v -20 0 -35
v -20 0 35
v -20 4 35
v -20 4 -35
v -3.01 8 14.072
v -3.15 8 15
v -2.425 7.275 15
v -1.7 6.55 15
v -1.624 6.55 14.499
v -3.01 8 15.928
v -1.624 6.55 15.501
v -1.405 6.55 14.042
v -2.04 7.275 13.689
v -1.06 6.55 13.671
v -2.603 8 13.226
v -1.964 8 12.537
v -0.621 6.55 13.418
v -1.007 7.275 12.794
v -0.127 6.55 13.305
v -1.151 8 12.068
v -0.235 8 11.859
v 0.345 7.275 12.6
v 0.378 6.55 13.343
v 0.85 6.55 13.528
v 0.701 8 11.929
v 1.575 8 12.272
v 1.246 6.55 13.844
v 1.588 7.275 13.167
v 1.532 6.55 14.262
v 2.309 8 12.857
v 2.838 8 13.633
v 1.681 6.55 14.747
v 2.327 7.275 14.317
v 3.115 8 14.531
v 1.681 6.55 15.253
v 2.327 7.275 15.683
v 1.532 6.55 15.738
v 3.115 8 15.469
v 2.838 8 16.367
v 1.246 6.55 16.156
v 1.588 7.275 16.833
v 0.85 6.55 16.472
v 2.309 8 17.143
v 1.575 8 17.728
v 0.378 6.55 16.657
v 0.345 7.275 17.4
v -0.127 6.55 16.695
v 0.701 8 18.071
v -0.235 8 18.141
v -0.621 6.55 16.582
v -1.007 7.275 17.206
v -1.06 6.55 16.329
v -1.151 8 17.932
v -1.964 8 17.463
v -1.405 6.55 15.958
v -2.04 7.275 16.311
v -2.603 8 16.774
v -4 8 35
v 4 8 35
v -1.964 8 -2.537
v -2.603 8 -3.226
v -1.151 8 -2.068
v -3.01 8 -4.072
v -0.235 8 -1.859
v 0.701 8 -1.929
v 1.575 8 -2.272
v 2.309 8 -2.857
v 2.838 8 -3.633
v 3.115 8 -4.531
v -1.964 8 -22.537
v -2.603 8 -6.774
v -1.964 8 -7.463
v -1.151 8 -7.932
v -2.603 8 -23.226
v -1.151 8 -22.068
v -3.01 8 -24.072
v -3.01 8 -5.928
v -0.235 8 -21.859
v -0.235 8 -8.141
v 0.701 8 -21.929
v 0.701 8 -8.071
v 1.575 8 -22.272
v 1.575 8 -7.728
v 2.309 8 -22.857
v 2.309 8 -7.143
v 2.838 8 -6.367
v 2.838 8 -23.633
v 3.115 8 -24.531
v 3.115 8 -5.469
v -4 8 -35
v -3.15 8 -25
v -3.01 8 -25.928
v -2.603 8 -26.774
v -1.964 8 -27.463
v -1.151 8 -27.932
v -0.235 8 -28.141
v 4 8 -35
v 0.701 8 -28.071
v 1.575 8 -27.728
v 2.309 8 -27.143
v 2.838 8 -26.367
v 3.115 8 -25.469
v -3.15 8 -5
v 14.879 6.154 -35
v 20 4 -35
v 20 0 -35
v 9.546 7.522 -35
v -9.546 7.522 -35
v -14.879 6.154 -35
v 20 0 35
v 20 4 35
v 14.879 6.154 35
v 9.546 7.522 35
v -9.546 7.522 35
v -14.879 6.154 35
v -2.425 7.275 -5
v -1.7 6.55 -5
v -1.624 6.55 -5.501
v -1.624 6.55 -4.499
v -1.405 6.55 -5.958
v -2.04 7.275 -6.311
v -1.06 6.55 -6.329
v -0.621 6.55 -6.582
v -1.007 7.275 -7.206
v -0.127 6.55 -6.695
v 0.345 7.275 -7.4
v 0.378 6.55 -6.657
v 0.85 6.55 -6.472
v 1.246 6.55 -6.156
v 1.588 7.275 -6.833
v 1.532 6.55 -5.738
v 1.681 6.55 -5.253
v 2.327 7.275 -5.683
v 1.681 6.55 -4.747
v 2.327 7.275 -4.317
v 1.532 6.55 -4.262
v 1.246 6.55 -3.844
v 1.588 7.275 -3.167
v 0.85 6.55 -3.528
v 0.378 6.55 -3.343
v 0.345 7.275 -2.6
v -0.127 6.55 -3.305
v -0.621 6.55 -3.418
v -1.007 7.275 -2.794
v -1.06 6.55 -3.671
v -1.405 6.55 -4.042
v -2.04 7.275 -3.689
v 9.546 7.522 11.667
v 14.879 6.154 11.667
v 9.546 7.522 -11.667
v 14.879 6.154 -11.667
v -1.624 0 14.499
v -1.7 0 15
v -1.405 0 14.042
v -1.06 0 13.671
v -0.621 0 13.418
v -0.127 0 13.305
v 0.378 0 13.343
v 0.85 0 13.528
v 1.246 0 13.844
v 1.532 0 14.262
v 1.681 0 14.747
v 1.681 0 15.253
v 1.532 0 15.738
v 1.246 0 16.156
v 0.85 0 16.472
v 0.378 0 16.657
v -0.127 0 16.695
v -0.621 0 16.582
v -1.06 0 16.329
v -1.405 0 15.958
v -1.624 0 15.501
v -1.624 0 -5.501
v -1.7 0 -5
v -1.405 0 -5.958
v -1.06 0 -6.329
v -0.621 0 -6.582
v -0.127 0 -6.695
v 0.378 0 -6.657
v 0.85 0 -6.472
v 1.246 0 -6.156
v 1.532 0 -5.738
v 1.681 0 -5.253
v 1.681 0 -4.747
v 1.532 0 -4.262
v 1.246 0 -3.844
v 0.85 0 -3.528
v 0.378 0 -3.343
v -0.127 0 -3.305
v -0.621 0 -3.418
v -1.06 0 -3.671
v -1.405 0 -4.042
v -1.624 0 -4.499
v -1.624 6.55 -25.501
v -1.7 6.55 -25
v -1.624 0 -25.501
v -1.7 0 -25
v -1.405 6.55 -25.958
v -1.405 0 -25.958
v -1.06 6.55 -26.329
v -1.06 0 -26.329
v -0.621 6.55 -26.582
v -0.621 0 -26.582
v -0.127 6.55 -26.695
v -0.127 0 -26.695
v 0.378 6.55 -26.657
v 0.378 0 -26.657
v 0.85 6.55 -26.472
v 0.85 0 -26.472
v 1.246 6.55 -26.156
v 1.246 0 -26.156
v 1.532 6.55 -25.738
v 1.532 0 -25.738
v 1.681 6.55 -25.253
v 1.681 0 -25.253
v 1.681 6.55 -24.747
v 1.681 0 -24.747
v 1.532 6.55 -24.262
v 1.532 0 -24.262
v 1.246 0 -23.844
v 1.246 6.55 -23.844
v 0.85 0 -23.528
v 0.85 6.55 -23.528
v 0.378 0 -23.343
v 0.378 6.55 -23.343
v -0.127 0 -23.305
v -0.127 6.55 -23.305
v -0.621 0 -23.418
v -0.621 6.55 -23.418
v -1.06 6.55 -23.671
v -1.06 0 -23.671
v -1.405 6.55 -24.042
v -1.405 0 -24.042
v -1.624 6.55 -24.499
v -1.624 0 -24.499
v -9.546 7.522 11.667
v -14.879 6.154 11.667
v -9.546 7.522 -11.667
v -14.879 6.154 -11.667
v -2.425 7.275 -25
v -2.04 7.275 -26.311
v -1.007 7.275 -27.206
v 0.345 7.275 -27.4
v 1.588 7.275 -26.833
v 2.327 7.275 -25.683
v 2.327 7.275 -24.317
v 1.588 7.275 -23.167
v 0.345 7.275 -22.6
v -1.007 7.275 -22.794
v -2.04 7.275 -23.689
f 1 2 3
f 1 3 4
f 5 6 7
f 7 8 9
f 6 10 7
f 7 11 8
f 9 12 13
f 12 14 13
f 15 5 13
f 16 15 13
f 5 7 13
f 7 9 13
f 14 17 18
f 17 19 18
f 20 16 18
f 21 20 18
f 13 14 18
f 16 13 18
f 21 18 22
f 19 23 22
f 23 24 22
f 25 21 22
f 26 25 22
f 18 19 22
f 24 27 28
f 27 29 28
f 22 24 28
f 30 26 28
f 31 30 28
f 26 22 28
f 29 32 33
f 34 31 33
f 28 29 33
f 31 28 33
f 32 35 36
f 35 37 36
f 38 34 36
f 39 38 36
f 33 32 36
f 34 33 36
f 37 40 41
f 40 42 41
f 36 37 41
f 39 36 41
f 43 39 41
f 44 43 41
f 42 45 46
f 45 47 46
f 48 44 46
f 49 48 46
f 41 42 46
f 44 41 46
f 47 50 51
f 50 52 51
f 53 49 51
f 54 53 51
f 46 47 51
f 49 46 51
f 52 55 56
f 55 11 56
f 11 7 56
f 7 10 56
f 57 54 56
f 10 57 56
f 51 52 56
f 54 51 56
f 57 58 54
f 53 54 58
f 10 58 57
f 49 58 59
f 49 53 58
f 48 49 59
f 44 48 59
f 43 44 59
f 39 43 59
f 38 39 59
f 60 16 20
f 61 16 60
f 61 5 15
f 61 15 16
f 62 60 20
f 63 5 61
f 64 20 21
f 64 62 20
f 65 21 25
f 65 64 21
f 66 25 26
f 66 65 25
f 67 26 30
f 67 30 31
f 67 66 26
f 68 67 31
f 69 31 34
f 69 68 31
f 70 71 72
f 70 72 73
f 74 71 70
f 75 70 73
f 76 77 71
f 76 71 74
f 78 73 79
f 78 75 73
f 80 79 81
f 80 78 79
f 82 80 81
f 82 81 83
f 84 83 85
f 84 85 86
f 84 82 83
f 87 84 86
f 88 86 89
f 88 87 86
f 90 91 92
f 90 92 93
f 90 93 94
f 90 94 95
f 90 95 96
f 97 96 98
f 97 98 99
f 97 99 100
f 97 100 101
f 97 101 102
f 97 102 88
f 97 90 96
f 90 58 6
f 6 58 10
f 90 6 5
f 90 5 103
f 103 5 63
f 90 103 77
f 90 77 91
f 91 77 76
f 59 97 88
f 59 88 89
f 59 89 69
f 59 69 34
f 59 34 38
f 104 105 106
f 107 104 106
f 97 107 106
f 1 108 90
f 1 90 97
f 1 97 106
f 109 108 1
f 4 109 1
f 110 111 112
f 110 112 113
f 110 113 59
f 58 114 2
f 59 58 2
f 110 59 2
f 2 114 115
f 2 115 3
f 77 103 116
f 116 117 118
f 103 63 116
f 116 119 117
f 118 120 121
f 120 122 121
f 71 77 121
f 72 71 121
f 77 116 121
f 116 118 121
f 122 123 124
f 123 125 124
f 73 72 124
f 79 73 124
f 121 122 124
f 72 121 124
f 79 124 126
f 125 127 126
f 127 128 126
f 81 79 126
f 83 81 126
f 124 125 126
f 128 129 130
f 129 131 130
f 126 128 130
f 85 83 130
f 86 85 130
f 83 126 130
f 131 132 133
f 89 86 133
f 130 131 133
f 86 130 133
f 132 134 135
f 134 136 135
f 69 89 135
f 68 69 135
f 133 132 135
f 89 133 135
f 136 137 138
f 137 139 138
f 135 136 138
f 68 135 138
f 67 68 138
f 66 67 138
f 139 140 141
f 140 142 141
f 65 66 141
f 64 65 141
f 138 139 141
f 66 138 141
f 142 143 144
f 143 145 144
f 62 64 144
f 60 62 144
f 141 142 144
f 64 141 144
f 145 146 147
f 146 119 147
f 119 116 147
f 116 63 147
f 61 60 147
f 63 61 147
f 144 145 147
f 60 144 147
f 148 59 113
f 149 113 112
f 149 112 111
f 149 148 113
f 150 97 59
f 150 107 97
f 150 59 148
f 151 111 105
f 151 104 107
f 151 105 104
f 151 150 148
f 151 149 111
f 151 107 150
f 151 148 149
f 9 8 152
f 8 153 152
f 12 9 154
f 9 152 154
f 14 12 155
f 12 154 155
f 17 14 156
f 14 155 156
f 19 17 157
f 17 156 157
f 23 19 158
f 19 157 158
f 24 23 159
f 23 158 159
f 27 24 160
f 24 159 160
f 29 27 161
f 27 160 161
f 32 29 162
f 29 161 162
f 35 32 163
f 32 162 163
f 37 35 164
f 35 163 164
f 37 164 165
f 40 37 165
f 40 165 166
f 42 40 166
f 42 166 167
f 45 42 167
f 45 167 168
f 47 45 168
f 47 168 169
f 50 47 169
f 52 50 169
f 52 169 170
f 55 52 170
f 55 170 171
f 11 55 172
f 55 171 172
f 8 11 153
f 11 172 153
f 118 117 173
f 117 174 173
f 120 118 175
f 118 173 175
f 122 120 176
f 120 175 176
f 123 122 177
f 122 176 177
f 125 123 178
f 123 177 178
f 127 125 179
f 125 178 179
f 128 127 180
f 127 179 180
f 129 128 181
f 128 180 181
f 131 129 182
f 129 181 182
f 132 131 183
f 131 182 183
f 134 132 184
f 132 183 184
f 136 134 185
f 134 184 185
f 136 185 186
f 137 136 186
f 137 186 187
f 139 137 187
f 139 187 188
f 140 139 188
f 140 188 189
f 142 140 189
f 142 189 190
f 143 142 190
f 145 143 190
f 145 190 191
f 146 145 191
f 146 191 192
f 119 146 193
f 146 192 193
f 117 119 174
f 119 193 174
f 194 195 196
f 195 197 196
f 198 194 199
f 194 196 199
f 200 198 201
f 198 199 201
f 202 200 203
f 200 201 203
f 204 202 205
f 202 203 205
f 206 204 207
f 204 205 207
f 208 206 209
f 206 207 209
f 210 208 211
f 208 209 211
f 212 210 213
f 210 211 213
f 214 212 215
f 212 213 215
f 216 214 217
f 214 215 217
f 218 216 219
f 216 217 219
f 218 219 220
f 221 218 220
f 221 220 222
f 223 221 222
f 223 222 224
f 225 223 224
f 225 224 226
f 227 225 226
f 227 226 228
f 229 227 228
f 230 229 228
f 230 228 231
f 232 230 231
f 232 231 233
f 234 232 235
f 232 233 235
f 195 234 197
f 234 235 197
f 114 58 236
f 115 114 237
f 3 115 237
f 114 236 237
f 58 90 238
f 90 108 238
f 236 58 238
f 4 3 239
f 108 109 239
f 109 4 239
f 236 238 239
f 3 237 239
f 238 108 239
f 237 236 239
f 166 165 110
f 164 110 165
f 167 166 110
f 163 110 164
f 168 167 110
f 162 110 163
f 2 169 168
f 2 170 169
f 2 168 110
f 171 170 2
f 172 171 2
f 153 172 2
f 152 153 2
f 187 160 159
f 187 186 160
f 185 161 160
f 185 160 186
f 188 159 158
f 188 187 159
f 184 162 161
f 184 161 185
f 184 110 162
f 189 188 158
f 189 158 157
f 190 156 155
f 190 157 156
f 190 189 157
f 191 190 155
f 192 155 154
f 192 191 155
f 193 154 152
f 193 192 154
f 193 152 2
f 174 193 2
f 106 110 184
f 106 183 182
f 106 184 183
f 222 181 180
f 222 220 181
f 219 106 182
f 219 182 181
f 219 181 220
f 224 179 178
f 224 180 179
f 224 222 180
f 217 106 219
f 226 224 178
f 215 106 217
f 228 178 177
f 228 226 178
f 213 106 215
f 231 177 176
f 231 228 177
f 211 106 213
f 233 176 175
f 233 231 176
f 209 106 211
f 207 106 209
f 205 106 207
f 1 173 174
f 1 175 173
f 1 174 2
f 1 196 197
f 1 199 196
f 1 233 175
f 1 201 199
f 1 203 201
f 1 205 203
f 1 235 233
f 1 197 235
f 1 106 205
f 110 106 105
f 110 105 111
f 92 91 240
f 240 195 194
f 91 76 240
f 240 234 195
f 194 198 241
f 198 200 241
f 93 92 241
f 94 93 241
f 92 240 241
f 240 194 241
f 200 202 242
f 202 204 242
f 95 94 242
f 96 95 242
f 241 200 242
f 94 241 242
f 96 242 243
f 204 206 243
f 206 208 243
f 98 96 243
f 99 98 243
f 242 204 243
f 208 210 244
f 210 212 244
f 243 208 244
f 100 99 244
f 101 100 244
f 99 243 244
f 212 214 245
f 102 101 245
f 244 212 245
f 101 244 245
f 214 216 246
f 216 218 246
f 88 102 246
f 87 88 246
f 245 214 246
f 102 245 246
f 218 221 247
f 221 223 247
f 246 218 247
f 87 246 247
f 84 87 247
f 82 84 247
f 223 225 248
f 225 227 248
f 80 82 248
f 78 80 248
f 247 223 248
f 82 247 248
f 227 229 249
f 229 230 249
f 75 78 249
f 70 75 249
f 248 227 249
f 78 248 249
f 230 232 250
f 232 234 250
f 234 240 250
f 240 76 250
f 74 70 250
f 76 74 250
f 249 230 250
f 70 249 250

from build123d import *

# Parameters (mm, degrees)
SKETCH1_R                                       = 1.25
BOSS_EXTRUDE1_DEPTH                             = 4
BOSS_EXTRUDE2_DEPTH                             = 70
SKETCH3_R                                       = 1.6
SKETCH3_R_2                                     = 1.625
CUT_EXTRUDE1_DEPTH                              = 70
CSK_FOR_M3_FLAT_HEAD_MACHINE_SCREW1_D           = 3.4
CSK_FOR_M3_FLAT_HEAD_MACHINE_SCREW1_CSINK_D     = 6.3
CSK_FOR_M3_FLAT_HEAD_MACHINE_SCREW1_CSINK_ANGLE = 90


with BuildPart() as part:
    # Sketch1 → Boss-Extrude1 (new body)
    with BuildSketch(Plane(origin=(0, 0, 0), x_dir=(1, 0, 0), z_dir=(0, 1, 0))):
        Polygon((0, 35), (20, 35), (20, -35), (0, -35), (-20, -35), (-20, 35), align=None)
        with Locations(Location((0, 25, 0), (0, 0, 270))):
            Circle(SKETCH1_R, mode=Mode.SUBTRACT)
        with Locations(Location((0, 5, 0), (0, 0, 270))):
            Circle(SKETCH1_R, mode=Mode.SUBTRACT)
        with Locations(Location((0, -15, 0), (0, 0, 270))):
            Circle(SKETCH1_R, mode=Mode.SUBTRACT)
    extrude(amount=BOSS_EXTRUDE1_DEPTH)

    # Sketch2 → Boss-Extrude2 (add)
    with BuildSketch(Plane(origin=(0, 0, -35), x_dir=(-1, 0, 0), z_dir=(0, 0, -1))):
        with BuildLine():
            Line((0, 8), (-4, 8))
            add(Edge.make_bspline(
                [(-4, 8), (-9.652249971, 8), (-14.984519901, 6.51388548), (-20, 4)],
                knots=[0, 0, 0, 0, 1, 1, 1, 1], degree=3))
            Line((-20, 4), (20, 4))
            add(Edge.make_bspline(
                [(4, 8), (9.652249971, 8), (14.984519901, 6.51388548), (20, 4)],
                knots=[0, 0, 0, 0, 1, 1, 1, 1], degree=3))
            Line((4, 8), (0, 8))
        make_face()
    extrude(amount=-BOSS_EXTRUDE2_DEPTH)

    # Sketch3 → Cut-Extrude1 (cut)
    with BuildSketch(Plane(origin=(0, 8, 0), x_dir=(1, 0, 0), z_dir=(0, 1, 0))):
        with Locations(Location((0, 25, 0), (0, 0, 270))):
            Circle(SKETCH3_R)
        with Locations(Location((0, 5, 0), (0, 0, 270))):
            Circle(SKETCH3_R)
        with Locations(Location((0, -15, 0), (0, 0, 270))):
            Circle(SKETCH3_R_2)
    extrude(amount=-CUT_EXTRUDE1_DEPTH, mode=Mode.SUBTRACT)

    # CSK for M3 Flat Head Machine Screw1 (through all)
    with Locations(Plane(origin=(0, 8, 0), x_dir=(1, 0, 0), z_dir=(0, 1, 0))):
        with Locations((0, 25), (0, 5), (0, -15)):
            CounterSinkHole(CSK_FOR_M3_FLAT_HEAD_MACHINE_SCREW1_D / 2, CSK_FOR_M3_FLAT_HEAD_MACHINE_SCREW1_CSINK_D / 2, counter_sink_angle=CSK_FOR_M3_FLAT_HEAD_MACHINE_SCREW1_CSINK_ANGLE)


solid = part.part
